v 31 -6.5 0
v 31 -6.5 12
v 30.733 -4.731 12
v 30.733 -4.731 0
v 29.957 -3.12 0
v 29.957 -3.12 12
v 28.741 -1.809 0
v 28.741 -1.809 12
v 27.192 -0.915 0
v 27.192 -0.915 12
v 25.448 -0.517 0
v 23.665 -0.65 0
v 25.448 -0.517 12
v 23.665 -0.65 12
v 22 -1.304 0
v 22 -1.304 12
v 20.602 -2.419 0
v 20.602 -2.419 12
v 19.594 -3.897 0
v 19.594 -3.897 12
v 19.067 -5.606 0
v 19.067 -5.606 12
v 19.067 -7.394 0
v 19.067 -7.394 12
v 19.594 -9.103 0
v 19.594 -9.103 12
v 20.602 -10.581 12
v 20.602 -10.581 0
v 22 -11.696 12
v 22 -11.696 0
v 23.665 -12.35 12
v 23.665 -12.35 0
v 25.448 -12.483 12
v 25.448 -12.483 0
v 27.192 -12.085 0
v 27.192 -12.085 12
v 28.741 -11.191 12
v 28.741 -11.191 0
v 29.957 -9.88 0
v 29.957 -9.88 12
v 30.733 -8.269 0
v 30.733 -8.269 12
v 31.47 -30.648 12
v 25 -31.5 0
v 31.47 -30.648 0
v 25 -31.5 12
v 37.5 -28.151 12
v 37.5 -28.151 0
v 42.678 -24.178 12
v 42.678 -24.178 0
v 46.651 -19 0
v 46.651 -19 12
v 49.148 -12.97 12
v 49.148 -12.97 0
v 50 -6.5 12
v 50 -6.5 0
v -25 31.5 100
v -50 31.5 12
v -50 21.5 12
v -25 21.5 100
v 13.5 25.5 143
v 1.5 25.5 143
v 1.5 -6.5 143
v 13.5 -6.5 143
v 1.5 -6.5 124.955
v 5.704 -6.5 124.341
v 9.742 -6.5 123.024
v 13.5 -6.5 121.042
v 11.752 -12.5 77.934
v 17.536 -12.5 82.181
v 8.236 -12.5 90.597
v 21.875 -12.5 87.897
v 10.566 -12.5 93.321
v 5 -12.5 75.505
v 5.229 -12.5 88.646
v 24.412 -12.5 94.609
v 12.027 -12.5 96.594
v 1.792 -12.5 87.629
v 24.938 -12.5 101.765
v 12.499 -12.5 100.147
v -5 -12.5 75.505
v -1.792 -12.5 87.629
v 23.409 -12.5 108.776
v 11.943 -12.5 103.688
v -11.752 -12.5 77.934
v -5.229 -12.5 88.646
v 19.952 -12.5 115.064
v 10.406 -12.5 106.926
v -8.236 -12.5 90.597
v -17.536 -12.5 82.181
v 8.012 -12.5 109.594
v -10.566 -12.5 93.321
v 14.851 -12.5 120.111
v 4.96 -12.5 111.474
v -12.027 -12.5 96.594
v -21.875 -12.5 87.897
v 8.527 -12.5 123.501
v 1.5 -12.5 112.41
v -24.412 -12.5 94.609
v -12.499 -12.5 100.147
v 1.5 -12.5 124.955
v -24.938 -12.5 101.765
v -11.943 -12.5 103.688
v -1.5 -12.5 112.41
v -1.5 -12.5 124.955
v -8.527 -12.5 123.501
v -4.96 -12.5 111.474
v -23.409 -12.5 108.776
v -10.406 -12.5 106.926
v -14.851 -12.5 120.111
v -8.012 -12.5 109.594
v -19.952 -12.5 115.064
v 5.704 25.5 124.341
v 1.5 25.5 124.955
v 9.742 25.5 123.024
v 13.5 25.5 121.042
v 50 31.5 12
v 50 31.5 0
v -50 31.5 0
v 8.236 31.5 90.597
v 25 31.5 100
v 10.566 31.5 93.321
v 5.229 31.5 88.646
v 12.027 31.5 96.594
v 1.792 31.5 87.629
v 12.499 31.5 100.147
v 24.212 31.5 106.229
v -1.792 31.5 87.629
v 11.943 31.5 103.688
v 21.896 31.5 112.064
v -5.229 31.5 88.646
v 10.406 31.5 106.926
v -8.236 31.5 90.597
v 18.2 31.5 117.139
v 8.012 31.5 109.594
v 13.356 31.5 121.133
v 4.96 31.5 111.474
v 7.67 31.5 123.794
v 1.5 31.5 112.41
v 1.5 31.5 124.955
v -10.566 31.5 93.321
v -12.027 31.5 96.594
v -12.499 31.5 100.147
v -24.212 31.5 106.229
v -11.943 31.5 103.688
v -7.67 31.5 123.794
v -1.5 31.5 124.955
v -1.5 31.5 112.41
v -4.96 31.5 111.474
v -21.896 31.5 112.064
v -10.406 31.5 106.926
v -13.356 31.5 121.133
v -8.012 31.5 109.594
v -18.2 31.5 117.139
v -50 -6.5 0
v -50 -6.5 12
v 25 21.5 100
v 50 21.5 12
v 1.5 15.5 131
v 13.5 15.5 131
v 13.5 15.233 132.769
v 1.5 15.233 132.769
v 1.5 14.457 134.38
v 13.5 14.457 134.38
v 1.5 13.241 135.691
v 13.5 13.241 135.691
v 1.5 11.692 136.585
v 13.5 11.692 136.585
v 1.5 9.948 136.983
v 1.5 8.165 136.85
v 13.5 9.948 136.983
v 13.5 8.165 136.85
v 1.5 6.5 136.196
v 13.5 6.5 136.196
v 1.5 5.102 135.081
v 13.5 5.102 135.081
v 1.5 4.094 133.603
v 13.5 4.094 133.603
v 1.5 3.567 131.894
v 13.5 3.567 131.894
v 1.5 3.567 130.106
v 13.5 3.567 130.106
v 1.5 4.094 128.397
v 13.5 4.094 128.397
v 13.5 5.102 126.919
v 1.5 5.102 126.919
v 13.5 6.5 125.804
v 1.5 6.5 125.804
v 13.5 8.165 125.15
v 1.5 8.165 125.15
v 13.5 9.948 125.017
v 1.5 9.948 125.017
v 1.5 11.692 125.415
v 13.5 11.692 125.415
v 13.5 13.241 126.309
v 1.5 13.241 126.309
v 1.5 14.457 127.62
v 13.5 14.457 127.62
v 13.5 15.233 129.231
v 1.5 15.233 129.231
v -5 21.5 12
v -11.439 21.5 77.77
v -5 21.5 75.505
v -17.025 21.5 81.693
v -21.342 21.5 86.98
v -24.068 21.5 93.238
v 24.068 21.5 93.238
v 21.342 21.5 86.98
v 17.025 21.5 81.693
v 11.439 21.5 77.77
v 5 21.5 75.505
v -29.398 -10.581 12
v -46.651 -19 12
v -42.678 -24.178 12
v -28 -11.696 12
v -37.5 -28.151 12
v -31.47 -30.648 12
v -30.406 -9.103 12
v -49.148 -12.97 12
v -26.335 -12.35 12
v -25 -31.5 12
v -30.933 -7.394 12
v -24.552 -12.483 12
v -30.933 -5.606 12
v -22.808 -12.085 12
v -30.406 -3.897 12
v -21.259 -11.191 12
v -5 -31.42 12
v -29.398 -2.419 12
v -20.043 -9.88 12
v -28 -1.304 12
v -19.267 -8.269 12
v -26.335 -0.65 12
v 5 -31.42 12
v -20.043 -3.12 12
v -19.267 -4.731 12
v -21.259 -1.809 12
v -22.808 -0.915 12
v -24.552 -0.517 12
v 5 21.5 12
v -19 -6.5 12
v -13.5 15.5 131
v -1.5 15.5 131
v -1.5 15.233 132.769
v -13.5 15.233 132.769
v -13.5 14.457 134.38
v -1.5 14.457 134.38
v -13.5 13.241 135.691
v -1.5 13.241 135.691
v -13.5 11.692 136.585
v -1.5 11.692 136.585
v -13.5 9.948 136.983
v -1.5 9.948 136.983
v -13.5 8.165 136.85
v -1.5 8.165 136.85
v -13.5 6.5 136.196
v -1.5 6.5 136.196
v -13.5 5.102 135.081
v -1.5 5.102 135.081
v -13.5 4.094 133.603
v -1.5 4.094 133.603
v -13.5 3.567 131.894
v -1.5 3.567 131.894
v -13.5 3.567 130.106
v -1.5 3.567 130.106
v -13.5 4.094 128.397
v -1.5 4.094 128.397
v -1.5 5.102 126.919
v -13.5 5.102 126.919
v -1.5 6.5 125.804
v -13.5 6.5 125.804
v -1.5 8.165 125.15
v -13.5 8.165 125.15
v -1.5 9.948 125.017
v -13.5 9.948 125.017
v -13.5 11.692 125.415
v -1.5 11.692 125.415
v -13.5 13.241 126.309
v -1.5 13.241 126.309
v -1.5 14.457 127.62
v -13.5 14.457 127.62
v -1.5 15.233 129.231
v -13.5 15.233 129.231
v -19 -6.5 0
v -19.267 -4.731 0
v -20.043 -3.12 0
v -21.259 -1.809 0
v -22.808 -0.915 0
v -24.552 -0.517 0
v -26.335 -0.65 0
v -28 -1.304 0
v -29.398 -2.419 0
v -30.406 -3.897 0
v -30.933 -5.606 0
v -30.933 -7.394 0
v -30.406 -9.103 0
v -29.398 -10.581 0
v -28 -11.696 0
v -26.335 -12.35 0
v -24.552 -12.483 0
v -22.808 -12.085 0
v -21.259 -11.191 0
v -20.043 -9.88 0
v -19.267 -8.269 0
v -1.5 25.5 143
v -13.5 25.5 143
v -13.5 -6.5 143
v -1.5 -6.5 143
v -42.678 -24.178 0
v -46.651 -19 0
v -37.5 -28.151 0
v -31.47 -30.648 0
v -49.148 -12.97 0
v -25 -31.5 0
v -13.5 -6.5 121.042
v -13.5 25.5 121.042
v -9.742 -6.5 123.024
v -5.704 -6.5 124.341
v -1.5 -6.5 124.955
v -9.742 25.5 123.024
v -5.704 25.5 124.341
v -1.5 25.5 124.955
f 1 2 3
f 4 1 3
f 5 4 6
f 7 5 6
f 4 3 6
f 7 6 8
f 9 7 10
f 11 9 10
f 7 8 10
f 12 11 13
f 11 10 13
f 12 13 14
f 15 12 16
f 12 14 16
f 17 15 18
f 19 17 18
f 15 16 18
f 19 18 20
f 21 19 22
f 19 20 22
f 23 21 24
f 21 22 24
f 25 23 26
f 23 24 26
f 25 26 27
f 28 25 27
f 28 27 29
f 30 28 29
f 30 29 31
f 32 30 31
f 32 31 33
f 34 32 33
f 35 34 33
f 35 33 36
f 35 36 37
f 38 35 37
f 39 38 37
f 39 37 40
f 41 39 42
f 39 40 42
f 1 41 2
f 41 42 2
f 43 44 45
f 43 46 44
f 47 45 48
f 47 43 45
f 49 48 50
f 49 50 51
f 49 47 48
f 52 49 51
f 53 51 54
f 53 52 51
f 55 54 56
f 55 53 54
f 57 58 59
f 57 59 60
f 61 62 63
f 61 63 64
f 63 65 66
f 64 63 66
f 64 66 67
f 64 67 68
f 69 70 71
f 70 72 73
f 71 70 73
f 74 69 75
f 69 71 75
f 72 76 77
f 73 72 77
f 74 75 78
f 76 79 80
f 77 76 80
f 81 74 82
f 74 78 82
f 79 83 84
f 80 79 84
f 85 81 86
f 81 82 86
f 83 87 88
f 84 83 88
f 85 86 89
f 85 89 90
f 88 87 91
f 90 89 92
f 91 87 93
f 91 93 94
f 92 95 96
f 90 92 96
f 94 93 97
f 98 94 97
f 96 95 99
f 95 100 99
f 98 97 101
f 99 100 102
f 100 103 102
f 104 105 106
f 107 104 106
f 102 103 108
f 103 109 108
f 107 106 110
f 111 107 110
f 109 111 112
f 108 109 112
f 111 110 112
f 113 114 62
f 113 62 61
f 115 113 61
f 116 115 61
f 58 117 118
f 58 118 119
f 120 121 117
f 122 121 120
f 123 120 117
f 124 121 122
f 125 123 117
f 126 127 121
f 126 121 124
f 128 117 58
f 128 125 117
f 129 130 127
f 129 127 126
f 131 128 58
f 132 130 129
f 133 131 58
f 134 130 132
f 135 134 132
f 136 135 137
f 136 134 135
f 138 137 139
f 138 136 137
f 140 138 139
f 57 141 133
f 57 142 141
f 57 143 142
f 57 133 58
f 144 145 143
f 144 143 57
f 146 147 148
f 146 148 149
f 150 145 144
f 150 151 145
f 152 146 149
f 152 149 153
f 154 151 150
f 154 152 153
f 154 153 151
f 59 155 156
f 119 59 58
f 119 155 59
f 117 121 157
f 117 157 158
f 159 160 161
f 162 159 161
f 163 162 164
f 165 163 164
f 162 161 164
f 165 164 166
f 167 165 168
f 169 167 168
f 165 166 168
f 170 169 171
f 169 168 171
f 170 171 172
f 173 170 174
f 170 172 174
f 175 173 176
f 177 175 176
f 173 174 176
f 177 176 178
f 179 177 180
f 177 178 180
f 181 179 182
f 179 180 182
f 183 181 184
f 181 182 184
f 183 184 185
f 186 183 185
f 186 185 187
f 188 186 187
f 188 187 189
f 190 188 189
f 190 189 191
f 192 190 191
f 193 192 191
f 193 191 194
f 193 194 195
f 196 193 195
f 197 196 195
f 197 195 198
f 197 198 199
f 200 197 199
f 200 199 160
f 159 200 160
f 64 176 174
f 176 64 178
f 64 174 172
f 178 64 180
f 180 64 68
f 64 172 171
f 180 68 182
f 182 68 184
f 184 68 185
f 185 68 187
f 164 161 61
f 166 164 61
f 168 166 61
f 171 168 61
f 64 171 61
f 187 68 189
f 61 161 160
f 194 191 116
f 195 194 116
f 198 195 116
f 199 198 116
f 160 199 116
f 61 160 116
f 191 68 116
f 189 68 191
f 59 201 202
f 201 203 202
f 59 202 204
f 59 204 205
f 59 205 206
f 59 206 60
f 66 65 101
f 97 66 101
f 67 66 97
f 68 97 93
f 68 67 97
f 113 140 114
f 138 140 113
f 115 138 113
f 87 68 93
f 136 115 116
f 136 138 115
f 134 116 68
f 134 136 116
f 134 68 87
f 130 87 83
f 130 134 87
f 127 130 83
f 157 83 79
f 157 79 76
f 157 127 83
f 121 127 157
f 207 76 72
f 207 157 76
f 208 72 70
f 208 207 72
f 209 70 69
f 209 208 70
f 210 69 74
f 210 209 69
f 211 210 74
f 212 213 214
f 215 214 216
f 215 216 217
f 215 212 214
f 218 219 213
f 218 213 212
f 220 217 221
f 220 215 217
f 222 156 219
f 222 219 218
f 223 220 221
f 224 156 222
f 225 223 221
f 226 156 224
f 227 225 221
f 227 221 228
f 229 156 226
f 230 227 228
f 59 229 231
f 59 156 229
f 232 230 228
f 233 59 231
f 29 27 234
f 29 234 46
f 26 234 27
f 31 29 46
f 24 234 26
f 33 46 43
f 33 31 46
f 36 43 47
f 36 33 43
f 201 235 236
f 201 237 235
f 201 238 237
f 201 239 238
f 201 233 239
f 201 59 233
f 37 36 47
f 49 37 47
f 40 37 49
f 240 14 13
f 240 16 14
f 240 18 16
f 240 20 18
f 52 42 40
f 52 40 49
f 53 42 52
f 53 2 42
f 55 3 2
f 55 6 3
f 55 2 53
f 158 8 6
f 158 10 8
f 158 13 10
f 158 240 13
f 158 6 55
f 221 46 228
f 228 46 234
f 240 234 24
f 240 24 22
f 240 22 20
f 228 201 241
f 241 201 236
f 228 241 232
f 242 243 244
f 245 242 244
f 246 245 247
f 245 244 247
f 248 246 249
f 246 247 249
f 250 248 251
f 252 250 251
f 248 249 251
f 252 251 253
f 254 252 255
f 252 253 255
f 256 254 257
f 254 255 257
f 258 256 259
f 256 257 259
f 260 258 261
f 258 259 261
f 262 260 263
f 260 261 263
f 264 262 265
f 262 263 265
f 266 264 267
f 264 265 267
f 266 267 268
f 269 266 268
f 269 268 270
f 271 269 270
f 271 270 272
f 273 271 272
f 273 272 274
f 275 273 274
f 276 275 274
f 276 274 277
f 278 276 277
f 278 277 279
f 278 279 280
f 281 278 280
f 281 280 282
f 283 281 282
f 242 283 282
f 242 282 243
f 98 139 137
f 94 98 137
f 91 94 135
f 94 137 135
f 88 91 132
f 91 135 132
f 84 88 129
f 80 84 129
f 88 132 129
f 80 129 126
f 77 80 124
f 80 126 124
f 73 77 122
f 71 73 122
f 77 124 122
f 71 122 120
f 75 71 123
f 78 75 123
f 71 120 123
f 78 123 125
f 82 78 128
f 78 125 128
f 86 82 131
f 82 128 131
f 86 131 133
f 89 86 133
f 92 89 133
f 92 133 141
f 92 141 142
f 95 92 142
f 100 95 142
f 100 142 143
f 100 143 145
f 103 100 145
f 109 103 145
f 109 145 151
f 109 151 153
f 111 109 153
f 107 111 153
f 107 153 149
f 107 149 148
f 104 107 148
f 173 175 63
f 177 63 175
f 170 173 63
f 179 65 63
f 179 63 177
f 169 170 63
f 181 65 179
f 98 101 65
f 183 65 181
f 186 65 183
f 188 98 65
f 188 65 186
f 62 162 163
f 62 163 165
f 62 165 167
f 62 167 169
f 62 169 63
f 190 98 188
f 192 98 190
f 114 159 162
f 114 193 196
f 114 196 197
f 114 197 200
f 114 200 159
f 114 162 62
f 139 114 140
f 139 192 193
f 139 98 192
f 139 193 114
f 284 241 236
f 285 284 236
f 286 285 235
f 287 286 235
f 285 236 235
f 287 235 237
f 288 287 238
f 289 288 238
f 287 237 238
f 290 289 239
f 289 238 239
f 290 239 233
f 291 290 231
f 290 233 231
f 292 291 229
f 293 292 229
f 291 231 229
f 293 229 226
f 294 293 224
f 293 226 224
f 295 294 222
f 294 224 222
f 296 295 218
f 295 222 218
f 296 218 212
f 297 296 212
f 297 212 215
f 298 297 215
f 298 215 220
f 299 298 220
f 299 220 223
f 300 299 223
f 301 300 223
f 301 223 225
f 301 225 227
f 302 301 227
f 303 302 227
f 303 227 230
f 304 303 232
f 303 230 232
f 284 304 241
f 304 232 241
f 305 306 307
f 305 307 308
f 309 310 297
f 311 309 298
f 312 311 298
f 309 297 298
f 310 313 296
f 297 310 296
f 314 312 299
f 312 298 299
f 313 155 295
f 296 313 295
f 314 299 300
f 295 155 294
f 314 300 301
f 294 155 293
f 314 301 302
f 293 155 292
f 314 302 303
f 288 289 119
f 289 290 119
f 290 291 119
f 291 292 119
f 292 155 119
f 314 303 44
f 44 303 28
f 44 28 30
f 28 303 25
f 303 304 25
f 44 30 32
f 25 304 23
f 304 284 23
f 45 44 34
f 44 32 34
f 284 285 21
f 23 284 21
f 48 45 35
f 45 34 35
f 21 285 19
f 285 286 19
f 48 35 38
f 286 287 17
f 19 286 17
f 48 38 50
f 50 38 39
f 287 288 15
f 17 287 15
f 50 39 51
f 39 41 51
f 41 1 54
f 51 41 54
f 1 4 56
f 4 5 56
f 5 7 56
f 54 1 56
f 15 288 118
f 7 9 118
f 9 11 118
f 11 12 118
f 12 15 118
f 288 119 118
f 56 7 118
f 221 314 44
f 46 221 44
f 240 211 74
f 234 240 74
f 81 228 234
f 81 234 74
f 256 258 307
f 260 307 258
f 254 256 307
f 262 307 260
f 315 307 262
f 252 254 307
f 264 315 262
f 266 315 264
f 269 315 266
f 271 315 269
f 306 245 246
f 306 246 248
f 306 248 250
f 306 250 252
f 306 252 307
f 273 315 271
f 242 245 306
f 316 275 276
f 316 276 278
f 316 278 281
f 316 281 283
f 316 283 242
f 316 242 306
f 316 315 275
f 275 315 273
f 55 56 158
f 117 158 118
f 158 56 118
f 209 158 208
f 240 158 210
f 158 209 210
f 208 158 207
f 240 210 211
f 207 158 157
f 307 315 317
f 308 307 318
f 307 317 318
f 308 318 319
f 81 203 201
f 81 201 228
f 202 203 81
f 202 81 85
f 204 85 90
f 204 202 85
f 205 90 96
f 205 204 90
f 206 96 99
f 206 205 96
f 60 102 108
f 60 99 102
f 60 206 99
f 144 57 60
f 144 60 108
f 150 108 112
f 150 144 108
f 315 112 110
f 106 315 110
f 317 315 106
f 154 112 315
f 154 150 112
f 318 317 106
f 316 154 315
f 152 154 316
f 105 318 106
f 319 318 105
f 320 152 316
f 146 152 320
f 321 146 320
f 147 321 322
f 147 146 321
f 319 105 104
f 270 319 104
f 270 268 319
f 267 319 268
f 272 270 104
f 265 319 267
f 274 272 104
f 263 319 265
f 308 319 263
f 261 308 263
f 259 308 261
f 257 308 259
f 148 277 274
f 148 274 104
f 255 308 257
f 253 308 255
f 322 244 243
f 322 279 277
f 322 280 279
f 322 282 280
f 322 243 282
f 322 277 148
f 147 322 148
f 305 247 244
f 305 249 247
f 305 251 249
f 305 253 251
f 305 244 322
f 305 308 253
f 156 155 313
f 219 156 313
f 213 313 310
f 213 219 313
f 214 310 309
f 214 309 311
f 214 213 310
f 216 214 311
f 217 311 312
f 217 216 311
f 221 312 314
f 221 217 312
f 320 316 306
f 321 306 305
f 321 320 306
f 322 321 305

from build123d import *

# Parameters (mm, degrees)
F0_W           = 100
F0_H           = 63
F1_DEPTH       = 12
F2_R           = 25
F3_R           = 6
F4_DEPTH       = 12
F5_R           = 6
F6_DEPTH       = 12
F7_R           = 25
F7_R_2         = 12.5
F8_DEPTH       = 44
F12_DEPTH      = 10
F14_DEPTH      = 10
F16_W          = 27
F16_H          = 32
F17_DEPTH      = 23
F18_W          = 10
F18_H          = 34
F21_DEPTH      = 10
F22_W          = 3
F22_H          = 60
F23_DEPTH      = 25
F23_DEPTH_BACK = 25
F24_R          = 6
F25_DEPTH      = 63.501


# Not quite as in the source:
# - a feature of the source that left no trace in its solid (it failed there, or was rolled back) is left out


with BuildPart() as f1:
    # F0 (on Top) → F1 (new body)
    with BuildSketch(Plane.XY):
        Rectangle(F0_W, F0_H)
    extrude(amount=F1_DEPTH)

    # F2
    f2_edges = [f1.edges().sort_by_distance(p)[0] for p in [
        (-50, -31.5, 6),
        (50, -31.5, 6),
    ]]
    fillet(f2_edges, radius=F2_R)

    # F3 (on face) → F4 (cut, through all)
    with BuildSketch(Plane.XY.offset(12)):
        with Locations((-25, -6.5)):
            Circle(F3_R)
    extrude(amount=-F4_DEPTH, mode=Mode.SUBTRACT)

    # F5 (on face) → F6 (cut, through all)
    with BuildSketch(Plane.XY.offset(12)):
        with Locations((25, -6.5)):
            Circle(F5_R)
    extrude(amount=-F6_DEPTH, mode=Mode.SUBTRACT)



with BuildPart() as f8:
    # F7 (on face) → F8 (new body)
    with BuildSketch(Plane(origin=(0, 31.5, 0), x_dir=(-1, 0, 0), z_dir=(0, 1, 0))):
        with Locations((0, 100)):
            Circle(F7_R)
        with Locations((0, 100)):
            Circle(F7_R_2, mode=Mode.SUBTRACT)
    extrude(amount=-F8_DEPTH)


with BuildPart() as f1_1:
    add(f1.part)

    add(f8.part)  # F12 merges F8
    # F11 (on face) → F12 (join)
    with BuildSketch(Plane(origin=(0, 31.5, 0), x_dir=(-1, 0, 0), z_dir=(0, 1, 0))):
        Polygon((-25, 100), (-50, 12), (-25, 12), align=None)
    extrude(amount=-F12_DEPTH)

    # F13 (on face) → F14 (join)
    with BuildSketch(Plane(origin=(0, 31.5, 0), x_dir=(-1, 0, 0), z_dir=(0, 1, 0))):
        Polygon((25, 100), (25, 12), (50, 12), align=None)
        with BuildLine():
            Line((-25, 12), (25, 12))
            Line((25, 12), (25, 100))
            ThreePointArc((25, 100), (0, 75), (-25, 100))
            Line((-25, 100), (-25, 12))
        make_face()
    extrude(amount=-F14_DEPTH)

    # F16 (on offset) → F17 (join)
    with BuildSketch(Plane.XY.offset(120)):
        with Locations((0, 9.5)):
            Rectangle(F16_W, F16_H)
    extrude(amount=F17_DEPTH)

    # F18 (on face) → F19 (join, up to the next surface of F1)
    with BuildSketch(Plane.XY.offset(12)):
        with Locations((0, 4.5)):
            Rectangle(F18_W, F18_H)
    extrude(until=Until.NEXT)

    # F20 (on face) → F21 (join)
    with BuildSketch(Plane(origin=(-5, 0, 0), x_dir=(0, -1, 0), z_dir=(-1, 0, 0))):
        Polygon((31.4197465777, 12), (12.5, 75.5051025722), (12.5, 12), align=None)
    extrude(amount=-F21_DEPTH)

    # F22 (on offset) → F23 (cut, two sides)
    with BuildSketch(Plane.XY.offset(120)) as f23_sk:
        with Locations((0, 3.3281182433)):
            Rectangle(F22_W, F22_H)
    extrude(amount=-F23_DEPTH, mode=Mode.SUBTRACT)
    extrude(f23_sk.sketch, amount=F23_DEPTH_BACK, mode=Mode.SUBTRACT)

    # F24 (on face) → F25 (cut, through all)
    with BuildSketch(Plane.YZ.offset(13.5)):
        with Locations((9.5, 131)):
            Circle(F24_R)
    extrude(amount=-F25_DEPTH, mode=Mode.SUBTRACT)


solid = f1_1.part
